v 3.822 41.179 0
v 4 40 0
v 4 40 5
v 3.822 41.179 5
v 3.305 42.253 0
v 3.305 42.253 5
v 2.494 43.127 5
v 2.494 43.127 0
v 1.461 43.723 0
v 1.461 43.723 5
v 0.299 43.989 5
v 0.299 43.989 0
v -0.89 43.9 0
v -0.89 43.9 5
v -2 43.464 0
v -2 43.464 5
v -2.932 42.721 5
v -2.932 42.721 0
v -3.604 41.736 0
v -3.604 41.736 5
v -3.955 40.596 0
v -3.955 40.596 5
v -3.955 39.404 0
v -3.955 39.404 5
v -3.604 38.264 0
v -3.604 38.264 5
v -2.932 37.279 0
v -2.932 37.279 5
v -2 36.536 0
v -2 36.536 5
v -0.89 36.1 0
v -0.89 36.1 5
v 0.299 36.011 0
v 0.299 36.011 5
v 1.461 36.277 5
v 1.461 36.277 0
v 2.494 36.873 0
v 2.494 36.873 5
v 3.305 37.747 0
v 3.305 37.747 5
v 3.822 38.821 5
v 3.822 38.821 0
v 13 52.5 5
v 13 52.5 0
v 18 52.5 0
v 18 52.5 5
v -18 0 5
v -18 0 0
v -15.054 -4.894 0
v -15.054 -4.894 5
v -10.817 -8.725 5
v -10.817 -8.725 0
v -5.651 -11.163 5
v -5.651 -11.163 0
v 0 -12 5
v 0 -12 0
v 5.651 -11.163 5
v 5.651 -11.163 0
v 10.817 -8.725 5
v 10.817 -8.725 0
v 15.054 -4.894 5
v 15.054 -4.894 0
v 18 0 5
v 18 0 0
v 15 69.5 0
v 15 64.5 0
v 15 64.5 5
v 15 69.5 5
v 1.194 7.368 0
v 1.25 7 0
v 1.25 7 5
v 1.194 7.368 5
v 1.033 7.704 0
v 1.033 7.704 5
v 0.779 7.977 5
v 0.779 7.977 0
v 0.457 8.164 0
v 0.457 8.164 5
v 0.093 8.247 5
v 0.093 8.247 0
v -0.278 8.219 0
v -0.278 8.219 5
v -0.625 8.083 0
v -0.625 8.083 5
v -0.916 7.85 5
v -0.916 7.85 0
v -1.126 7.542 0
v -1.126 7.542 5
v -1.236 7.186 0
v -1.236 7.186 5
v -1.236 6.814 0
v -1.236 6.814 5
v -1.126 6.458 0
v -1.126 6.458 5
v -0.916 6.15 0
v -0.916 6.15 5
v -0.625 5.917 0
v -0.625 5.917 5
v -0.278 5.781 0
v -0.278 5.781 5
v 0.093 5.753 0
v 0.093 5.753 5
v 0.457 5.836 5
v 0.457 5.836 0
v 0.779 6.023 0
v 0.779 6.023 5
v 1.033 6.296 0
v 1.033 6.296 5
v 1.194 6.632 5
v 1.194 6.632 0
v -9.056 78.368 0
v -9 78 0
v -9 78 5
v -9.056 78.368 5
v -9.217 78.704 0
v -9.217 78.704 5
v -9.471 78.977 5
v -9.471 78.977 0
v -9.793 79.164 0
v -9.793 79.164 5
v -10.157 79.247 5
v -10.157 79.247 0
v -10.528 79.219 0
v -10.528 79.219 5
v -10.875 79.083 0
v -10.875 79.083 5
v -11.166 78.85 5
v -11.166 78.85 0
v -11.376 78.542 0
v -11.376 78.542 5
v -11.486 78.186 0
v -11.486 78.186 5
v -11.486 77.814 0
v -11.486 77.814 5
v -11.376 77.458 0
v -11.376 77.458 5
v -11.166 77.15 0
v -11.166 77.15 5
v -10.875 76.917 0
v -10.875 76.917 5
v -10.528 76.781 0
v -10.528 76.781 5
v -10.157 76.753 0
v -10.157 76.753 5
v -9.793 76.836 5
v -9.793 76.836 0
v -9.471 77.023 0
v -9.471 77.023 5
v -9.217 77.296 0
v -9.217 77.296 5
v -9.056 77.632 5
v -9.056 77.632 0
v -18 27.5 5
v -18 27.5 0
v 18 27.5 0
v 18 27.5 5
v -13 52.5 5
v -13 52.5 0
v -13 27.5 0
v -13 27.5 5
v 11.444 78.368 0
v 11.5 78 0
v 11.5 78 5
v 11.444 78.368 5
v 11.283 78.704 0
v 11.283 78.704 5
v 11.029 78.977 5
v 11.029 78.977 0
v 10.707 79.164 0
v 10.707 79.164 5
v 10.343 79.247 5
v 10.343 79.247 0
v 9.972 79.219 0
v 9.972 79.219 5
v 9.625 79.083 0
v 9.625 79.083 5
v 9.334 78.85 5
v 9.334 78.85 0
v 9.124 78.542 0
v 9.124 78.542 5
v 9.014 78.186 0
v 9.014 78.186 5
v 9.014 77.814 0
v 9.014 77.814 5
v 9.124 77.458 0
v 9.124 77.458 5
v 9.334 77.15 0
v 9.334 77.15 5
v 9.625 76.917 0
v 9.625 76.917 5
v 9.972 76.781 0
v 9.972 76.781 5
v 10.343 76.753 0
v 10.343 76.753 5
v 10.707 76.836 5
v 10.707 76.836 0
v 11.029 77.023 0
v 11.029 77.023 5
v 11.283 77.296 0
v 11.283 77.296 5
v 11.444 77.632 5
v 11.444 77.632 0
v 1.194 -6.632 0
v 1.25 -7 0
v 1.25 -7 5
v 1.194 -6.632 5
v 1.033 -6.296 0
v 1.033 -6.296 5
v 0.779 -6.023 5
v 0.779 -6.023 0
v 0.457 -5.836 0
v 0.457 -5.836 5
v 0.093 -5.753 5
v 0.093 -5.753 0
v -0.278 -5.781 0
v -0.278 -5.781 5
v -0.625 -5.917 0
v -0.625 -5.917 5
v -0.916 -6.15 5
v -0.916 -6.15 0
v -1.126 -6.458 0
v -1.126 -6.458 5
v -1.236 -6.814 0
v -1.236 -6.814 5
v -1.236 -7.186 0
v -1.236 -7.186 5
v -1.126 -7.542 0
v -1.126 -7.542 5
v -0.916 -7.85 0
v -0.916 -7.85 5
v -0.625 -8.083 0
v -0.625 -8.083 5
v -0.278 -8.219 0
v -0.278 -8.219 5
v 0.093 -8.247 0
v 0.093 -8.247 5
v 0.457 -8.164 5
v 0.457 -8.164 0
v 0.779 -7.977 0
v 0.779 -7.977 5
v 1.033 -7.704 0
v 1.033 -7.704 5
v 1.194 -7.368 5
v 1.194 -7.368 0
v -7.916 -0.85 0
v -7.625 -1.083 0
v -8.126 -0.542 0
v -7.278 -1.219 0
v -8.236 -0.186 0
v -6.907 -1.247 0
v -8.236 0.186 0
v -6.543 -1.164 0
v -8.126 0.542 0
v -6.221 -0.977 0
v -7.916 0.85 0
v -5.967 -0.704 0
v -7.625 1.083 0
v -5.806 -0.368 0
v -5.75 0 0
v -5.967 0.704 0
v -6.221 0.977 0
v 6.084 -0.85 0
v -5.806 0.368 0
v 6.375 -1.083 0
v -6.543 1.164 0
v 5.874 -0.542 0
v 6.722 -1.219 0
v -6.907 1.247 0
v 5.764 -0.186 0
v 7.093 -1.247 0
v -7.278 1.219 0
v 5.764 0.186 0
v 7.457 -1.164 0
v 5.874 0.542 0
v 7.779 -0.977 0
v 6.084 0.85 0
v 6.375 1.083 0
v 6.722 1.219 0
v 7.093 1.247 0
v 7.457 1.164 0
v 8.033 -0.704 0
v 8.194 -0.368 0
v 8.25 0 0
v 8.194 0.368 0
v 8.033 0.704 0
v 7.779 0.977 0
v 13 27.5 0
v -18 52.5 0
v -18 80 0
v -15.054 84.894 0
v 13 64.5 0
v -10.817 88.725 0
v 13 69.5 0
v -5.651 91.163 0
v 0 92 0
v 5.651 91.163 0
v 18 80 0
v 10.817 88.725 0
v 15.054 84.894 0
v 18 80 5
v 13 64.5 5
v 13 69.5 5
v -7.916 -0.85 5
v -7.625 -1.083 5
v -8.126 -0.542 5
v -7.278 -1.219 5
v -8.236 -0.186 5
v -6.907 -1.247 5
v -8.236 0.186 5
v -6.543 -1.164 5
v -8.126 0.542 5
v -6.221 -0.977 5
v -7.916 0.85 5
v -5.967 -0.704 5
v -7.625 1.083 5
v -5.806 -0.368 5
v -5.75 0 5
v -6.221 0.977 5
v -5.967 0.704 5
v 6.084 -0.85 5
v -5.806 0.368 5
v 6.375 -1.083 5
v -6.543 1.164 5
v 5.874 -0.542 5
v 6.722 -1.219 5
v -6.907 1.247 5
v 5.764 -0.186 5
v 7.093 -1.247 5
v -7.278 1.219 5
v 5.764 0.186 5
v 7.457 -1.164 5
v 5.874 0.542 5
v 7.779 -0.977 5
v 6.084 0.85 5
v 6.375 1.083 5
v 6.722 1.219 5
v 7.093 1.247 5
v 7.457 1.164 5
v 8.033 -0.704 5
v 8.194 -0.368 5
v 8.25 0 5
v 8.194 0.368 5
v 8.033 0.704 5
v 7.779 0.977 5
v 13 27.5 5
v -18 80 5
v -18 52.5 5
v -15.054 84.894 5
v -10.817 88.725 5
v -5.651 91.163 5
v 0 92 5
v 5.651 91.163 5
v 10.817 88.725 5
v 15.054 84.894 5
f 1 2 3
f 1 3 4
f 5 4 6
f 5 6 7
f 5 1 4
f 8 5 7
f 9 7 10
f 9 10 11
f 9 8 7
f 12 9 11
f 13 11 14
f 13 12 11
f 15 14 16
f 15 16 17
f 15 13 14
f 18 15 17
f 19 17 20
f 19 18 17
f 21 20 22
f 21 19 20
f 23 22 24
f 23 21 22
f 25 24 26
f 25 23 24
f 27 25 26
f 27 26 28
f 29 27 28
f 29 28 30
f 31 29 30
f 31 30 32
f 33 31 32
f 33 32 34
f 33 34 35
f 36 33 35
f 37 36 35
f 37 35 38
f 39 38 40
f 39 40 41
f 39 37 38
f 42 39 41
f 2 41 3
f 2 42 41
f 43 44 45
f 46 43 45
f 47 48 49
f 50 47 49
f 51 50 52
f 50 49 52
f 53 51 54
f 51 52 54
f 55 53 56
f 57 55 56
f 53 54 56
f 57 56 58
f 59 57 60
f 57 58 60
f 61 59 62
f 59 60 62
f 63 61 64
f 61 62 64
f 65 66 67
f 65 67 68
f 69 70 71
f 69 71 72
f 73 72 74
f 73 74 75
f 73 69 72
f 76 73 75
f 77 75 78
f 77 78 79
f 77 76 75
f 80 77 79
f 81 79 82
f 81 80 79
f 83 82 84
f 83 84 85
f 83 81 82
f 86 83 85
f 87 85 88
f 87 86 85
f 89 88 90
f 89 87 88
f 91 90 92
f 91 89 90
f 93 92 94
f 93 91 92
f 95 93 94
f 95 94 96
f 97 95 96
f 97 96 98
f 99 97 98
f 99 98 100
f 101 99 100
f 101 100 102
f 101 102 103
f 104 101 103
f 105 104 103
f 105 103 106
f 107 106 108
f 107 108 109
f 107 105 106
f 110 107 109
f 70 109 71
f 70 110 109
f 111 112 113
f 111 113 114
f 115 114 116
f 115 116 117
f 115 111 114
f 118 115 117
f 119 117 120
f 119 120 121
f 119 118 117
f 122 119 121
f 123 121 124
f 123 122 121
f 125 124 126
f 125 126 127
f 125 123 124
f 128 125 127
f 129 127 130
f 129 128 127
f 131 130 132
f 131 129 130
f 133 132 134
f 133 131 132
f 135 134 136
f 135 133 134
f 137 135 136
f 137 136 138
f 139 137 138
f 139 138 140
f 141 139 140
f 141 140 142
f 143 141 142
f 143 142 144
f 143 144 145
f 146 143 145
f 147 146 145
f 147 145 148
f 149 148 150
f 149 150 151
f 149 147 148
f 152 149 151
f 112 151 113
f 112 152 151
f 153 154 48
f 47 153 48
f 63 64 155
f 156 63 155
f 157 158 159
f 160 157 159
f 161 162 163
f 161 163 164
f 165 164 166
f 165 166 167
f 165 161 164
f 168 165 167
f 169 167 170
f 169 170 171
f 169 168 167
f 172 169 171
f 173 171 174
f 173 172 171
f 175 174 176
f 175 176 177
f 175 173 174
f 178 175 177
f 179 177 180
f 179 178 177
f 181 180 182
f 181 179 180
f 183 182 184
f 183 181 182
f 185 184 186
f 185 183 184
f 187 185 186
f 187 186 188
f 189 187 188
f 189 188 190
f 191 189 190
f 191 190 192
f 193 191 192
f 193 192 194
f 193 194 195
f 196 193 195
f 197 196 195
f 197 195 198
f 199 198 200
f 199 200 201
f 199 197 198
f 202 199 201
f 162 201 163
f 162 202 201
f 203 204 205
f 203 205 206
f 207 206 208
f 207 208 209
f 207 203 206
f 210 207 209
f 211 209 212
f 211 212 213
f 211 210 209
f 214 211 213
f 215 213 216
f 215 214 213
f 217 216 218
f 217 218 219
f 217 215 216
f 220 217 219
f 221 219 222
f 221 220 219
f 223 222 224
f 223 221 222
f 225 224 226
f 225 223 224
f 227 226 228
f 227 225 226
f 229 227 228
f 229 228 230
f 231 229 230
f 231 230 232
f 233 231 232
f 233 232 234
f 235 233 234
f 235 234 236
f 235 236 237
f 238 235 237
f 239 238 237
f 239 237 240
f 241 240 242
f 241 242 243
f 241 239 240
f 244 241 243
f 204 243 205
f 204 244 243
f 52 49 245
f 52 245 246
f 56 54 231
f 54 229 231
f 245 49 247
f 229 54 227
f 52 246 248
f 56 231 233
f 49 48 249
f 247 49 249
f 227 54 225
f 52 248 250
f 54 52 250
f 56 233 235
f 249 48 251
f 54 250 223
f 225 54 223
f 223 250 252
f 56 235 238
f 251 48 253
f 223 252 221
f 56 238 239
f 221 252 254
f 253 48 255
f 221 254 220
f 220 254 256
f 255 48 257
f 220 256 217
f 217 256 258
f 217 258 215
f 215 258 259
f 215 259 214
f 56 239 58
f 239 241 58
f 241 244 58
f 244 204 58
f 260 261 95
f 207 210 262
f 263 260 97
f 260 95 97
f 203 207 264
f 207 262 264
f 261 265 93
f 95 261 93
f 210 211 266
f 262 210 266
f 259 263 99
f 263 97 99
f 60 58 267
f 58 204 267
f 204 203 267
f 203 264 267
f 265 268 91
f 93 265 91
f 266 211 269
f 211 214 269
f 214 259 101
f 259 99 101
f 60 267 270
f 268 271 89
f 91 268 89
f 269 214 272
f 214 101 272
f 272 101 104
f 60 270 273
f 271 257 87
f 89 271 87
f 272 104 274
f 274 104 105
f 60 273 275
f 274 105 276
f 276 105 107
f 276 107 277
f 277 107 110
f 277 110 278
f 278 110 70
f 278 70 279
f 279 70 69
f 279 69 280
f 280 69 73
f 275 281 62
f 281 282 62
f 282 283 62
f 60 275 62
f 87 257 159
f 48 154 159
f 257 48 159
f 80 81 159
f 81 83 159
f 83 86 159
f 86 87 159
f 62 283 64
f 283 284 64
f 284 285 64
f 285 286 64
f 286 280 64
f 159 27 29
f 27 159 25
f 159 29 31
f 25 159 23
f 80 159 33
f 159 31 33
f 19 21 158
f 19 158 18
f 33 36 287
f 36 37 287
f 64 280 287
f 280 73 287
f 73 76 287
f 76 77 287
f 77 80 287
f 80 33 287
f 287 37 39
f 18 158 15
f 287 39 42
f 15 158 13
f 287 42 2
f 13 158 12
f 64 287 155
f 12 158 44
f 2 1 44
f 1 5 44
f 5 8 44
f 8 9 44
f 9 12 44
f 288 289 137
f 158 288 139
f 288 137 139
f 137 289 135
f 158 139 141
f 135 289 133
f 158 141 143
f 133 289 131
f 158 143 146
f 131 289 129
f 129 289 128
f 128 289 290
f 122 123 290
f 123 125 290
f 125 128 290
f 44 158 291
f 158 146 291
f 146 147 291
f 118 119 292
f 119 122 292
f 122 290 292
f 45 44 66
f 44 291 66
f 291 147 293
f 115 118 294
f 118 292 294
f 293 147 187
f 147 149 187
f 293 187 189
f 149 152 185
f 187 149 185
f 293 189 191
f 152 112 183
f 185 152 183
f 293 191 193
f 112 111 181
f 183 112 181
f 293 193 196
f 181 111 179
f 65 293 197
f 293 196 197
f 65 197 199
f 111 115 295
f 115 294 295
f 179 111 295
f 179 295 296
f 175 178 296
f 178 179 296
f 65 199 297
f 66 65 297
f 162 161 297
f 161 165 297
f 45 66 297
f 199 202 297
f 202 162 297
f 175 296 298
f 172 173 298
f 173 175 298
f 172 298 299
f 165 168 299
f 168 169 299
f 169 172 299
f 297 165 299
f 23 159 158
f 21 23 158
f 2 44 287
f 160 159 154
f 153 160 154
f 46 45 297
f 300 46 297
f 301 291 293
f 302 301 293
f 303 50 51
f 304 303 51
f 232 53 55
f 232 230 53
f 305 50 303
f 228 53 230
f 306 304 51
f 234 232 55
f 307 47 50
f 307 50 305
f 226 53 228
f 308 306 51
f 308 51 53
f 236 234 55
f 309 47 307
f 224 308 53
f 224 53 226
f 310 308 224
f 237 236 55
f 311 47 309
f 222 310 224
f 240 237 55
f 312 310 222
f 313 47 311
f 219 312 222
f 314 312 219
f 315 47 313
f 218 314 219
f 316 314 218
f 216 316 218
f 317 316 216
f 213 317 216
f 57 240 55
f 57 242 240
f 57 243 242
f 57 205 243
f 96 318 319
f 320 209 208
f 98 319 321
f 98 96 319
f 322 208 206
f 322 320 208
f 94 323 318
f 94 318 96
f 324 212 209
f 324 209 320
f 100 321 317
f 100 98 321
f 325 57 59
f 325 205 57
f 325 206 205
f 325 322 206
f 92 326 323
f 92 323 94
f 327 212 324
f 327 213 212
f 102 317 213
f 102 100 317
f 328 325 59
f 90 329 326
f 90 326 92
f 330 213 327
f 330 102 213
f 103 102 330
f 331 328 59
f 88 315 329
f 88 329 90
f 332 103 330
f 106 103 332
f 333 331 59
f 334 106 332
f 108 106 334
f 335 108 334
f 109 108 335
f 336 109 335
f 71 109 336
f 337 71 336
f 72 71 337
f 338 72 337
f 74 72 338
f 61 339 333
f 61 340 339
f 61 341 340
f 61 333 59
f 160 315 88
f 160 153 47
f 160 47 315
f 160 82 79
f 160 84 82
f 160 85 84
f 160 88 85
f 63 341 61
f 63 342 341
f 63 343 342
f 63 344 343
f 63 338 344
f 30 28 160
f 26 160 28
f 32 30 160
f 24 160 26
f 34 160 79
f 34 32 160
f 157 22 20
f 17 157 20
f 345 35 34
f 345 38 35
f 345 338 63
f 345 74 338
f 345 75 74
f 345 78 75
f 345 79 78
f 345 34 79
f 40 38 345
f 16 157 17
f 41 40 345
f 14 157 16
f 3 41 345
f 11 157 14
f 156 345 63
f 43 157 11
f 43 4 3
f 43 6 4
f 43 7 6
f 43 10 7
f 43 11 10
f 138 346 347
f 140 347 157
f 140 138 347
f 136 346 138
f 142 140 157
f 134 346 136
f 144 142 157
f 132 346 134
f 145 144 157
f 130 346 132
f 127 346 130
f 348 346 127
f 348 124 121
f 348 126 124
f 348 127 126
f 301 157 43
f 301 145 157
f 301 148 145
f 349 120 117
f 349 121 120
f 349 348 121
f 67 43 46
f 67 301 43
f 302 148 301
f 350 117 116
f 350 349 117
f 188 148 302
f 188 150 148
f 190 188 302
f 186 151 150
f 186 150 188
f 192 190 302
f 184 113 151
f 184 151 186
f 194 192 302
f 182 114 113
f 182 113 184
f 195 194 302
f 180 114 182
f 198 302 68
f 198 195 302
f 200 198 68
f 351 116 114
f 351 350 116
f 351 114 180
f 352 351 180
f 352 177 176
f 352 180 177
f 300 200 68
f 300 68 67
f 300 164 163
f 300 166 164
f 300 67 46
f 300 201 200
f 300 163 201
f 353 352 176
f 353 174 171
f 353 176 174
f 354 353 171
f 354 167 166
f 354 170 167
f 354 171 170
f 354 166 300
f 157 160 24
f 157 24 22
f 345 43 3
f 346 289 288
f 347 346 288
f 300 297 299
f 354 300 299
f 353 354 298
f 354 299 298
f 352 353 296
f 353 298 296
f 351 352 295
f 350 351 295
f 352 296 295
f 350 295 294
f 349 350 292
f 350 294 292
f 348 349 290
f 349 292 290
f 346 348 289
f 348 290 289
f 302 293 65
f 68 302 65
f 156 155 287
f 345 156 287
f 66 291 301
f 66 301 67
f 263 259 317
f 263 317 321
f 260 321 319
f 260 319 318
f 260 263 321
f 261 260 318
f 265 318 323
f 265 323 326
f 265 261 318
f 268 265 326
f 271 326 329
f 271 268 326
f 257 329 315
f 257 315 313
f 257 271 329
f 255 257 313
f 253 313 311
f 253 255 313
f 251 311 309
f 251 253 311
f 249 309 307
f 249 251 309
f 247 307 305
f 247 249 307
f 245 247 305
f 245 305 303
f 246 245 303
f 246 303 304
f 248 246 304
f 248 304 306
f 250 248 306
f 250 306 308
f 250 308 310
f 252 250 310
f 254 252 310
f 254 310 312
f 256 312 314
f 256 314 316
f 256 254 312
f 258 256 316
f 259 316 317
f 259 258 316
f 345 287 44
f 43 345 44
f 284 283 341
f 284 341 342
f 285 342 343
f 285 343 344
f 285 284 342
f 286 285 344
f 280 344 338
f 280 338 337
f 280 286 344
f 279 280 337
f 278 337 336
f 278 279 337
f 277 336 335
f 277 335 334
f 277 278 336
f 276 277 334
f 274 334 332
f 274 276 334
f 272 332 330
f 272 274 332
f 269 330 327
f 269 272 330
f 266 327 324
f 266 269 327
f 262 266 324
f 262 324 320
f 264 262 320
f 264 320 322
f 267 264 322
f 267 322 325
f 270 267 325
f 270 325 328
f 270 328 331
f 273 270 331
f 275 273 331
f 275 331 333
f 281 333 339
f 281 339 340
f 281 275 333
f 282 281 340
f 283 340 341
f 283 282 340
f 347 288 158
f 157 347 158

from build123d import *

# Parameters (mm, degrees)
SKETCH1_R           = 1.25
SKETCH1_R_2         = 4
SKETCH1_W           = 2
SKETCH1_H           = 5
BOSS_EXTRUDE1_DEPTH = 5


with BuildPart() as part:
    # Sketch1 → Boss-Extrude1 (new body)
    with BuildSketch(Plane.XY):
        with BuildLine():
            Line((-18, 80), (-18, 52.5))
            Line((-18, 52.5), (-13, 52.5))
            Line((-13, 52.5), (-13, 27.5))
            Line((-13, 27.5), (-18, 27.5))
            Line((-18, 27.5), (-18, 0))
            ThreePointArc((-18, 0), (0, -12), (18, 0))
            Line((18, 0), (18, 27.5))
            Line((18, 27.5), (13, 27.5))
            Line((13, 27.5), (13, 52.5))
            Line((13, 52.5), (18, 52.5))
            Line((18, 52.5), (18, 80))
            ThreePointArc((18, 80), (0, 92), (-18, 80))
        make_face()
        with Locations((0, 7)):
            Circle(SKETCH1_R, mode=Mode.SUBTRACT)
        with Locations((7, 0)):
            Circle(SKETCH1_R, mode=Mode.SUBTRACT)
        with Locations((0, -7)):
            Circle(SKETCH1_R, mode=Mode.SUBTRACT)
        with Locations((-7, 0)):
            Circle(SKETCH1_R, mode=Mode.SUBTRACT)
        with Locations((0, 40)):
            Circle(SKETCH1_R_2, mode=Mode.SUBTRACT)
        with Locations((-10.25, 78)):
            Circle(SKETCH1_R, mode=Mode.SUBTRACT)
        with Locations((10.25, 78)):
            Circle(SKETCH1_R, mode=Mode.SUBTRACT)
        with Locations((14, 67)):
            Rectangle(SKETCH1_W, SKETCH1_H, mode=Mode.SUBTRACT)
    extrude(amount=BOSS_EXTRUDE1_DEPTH)


solid = part.part
